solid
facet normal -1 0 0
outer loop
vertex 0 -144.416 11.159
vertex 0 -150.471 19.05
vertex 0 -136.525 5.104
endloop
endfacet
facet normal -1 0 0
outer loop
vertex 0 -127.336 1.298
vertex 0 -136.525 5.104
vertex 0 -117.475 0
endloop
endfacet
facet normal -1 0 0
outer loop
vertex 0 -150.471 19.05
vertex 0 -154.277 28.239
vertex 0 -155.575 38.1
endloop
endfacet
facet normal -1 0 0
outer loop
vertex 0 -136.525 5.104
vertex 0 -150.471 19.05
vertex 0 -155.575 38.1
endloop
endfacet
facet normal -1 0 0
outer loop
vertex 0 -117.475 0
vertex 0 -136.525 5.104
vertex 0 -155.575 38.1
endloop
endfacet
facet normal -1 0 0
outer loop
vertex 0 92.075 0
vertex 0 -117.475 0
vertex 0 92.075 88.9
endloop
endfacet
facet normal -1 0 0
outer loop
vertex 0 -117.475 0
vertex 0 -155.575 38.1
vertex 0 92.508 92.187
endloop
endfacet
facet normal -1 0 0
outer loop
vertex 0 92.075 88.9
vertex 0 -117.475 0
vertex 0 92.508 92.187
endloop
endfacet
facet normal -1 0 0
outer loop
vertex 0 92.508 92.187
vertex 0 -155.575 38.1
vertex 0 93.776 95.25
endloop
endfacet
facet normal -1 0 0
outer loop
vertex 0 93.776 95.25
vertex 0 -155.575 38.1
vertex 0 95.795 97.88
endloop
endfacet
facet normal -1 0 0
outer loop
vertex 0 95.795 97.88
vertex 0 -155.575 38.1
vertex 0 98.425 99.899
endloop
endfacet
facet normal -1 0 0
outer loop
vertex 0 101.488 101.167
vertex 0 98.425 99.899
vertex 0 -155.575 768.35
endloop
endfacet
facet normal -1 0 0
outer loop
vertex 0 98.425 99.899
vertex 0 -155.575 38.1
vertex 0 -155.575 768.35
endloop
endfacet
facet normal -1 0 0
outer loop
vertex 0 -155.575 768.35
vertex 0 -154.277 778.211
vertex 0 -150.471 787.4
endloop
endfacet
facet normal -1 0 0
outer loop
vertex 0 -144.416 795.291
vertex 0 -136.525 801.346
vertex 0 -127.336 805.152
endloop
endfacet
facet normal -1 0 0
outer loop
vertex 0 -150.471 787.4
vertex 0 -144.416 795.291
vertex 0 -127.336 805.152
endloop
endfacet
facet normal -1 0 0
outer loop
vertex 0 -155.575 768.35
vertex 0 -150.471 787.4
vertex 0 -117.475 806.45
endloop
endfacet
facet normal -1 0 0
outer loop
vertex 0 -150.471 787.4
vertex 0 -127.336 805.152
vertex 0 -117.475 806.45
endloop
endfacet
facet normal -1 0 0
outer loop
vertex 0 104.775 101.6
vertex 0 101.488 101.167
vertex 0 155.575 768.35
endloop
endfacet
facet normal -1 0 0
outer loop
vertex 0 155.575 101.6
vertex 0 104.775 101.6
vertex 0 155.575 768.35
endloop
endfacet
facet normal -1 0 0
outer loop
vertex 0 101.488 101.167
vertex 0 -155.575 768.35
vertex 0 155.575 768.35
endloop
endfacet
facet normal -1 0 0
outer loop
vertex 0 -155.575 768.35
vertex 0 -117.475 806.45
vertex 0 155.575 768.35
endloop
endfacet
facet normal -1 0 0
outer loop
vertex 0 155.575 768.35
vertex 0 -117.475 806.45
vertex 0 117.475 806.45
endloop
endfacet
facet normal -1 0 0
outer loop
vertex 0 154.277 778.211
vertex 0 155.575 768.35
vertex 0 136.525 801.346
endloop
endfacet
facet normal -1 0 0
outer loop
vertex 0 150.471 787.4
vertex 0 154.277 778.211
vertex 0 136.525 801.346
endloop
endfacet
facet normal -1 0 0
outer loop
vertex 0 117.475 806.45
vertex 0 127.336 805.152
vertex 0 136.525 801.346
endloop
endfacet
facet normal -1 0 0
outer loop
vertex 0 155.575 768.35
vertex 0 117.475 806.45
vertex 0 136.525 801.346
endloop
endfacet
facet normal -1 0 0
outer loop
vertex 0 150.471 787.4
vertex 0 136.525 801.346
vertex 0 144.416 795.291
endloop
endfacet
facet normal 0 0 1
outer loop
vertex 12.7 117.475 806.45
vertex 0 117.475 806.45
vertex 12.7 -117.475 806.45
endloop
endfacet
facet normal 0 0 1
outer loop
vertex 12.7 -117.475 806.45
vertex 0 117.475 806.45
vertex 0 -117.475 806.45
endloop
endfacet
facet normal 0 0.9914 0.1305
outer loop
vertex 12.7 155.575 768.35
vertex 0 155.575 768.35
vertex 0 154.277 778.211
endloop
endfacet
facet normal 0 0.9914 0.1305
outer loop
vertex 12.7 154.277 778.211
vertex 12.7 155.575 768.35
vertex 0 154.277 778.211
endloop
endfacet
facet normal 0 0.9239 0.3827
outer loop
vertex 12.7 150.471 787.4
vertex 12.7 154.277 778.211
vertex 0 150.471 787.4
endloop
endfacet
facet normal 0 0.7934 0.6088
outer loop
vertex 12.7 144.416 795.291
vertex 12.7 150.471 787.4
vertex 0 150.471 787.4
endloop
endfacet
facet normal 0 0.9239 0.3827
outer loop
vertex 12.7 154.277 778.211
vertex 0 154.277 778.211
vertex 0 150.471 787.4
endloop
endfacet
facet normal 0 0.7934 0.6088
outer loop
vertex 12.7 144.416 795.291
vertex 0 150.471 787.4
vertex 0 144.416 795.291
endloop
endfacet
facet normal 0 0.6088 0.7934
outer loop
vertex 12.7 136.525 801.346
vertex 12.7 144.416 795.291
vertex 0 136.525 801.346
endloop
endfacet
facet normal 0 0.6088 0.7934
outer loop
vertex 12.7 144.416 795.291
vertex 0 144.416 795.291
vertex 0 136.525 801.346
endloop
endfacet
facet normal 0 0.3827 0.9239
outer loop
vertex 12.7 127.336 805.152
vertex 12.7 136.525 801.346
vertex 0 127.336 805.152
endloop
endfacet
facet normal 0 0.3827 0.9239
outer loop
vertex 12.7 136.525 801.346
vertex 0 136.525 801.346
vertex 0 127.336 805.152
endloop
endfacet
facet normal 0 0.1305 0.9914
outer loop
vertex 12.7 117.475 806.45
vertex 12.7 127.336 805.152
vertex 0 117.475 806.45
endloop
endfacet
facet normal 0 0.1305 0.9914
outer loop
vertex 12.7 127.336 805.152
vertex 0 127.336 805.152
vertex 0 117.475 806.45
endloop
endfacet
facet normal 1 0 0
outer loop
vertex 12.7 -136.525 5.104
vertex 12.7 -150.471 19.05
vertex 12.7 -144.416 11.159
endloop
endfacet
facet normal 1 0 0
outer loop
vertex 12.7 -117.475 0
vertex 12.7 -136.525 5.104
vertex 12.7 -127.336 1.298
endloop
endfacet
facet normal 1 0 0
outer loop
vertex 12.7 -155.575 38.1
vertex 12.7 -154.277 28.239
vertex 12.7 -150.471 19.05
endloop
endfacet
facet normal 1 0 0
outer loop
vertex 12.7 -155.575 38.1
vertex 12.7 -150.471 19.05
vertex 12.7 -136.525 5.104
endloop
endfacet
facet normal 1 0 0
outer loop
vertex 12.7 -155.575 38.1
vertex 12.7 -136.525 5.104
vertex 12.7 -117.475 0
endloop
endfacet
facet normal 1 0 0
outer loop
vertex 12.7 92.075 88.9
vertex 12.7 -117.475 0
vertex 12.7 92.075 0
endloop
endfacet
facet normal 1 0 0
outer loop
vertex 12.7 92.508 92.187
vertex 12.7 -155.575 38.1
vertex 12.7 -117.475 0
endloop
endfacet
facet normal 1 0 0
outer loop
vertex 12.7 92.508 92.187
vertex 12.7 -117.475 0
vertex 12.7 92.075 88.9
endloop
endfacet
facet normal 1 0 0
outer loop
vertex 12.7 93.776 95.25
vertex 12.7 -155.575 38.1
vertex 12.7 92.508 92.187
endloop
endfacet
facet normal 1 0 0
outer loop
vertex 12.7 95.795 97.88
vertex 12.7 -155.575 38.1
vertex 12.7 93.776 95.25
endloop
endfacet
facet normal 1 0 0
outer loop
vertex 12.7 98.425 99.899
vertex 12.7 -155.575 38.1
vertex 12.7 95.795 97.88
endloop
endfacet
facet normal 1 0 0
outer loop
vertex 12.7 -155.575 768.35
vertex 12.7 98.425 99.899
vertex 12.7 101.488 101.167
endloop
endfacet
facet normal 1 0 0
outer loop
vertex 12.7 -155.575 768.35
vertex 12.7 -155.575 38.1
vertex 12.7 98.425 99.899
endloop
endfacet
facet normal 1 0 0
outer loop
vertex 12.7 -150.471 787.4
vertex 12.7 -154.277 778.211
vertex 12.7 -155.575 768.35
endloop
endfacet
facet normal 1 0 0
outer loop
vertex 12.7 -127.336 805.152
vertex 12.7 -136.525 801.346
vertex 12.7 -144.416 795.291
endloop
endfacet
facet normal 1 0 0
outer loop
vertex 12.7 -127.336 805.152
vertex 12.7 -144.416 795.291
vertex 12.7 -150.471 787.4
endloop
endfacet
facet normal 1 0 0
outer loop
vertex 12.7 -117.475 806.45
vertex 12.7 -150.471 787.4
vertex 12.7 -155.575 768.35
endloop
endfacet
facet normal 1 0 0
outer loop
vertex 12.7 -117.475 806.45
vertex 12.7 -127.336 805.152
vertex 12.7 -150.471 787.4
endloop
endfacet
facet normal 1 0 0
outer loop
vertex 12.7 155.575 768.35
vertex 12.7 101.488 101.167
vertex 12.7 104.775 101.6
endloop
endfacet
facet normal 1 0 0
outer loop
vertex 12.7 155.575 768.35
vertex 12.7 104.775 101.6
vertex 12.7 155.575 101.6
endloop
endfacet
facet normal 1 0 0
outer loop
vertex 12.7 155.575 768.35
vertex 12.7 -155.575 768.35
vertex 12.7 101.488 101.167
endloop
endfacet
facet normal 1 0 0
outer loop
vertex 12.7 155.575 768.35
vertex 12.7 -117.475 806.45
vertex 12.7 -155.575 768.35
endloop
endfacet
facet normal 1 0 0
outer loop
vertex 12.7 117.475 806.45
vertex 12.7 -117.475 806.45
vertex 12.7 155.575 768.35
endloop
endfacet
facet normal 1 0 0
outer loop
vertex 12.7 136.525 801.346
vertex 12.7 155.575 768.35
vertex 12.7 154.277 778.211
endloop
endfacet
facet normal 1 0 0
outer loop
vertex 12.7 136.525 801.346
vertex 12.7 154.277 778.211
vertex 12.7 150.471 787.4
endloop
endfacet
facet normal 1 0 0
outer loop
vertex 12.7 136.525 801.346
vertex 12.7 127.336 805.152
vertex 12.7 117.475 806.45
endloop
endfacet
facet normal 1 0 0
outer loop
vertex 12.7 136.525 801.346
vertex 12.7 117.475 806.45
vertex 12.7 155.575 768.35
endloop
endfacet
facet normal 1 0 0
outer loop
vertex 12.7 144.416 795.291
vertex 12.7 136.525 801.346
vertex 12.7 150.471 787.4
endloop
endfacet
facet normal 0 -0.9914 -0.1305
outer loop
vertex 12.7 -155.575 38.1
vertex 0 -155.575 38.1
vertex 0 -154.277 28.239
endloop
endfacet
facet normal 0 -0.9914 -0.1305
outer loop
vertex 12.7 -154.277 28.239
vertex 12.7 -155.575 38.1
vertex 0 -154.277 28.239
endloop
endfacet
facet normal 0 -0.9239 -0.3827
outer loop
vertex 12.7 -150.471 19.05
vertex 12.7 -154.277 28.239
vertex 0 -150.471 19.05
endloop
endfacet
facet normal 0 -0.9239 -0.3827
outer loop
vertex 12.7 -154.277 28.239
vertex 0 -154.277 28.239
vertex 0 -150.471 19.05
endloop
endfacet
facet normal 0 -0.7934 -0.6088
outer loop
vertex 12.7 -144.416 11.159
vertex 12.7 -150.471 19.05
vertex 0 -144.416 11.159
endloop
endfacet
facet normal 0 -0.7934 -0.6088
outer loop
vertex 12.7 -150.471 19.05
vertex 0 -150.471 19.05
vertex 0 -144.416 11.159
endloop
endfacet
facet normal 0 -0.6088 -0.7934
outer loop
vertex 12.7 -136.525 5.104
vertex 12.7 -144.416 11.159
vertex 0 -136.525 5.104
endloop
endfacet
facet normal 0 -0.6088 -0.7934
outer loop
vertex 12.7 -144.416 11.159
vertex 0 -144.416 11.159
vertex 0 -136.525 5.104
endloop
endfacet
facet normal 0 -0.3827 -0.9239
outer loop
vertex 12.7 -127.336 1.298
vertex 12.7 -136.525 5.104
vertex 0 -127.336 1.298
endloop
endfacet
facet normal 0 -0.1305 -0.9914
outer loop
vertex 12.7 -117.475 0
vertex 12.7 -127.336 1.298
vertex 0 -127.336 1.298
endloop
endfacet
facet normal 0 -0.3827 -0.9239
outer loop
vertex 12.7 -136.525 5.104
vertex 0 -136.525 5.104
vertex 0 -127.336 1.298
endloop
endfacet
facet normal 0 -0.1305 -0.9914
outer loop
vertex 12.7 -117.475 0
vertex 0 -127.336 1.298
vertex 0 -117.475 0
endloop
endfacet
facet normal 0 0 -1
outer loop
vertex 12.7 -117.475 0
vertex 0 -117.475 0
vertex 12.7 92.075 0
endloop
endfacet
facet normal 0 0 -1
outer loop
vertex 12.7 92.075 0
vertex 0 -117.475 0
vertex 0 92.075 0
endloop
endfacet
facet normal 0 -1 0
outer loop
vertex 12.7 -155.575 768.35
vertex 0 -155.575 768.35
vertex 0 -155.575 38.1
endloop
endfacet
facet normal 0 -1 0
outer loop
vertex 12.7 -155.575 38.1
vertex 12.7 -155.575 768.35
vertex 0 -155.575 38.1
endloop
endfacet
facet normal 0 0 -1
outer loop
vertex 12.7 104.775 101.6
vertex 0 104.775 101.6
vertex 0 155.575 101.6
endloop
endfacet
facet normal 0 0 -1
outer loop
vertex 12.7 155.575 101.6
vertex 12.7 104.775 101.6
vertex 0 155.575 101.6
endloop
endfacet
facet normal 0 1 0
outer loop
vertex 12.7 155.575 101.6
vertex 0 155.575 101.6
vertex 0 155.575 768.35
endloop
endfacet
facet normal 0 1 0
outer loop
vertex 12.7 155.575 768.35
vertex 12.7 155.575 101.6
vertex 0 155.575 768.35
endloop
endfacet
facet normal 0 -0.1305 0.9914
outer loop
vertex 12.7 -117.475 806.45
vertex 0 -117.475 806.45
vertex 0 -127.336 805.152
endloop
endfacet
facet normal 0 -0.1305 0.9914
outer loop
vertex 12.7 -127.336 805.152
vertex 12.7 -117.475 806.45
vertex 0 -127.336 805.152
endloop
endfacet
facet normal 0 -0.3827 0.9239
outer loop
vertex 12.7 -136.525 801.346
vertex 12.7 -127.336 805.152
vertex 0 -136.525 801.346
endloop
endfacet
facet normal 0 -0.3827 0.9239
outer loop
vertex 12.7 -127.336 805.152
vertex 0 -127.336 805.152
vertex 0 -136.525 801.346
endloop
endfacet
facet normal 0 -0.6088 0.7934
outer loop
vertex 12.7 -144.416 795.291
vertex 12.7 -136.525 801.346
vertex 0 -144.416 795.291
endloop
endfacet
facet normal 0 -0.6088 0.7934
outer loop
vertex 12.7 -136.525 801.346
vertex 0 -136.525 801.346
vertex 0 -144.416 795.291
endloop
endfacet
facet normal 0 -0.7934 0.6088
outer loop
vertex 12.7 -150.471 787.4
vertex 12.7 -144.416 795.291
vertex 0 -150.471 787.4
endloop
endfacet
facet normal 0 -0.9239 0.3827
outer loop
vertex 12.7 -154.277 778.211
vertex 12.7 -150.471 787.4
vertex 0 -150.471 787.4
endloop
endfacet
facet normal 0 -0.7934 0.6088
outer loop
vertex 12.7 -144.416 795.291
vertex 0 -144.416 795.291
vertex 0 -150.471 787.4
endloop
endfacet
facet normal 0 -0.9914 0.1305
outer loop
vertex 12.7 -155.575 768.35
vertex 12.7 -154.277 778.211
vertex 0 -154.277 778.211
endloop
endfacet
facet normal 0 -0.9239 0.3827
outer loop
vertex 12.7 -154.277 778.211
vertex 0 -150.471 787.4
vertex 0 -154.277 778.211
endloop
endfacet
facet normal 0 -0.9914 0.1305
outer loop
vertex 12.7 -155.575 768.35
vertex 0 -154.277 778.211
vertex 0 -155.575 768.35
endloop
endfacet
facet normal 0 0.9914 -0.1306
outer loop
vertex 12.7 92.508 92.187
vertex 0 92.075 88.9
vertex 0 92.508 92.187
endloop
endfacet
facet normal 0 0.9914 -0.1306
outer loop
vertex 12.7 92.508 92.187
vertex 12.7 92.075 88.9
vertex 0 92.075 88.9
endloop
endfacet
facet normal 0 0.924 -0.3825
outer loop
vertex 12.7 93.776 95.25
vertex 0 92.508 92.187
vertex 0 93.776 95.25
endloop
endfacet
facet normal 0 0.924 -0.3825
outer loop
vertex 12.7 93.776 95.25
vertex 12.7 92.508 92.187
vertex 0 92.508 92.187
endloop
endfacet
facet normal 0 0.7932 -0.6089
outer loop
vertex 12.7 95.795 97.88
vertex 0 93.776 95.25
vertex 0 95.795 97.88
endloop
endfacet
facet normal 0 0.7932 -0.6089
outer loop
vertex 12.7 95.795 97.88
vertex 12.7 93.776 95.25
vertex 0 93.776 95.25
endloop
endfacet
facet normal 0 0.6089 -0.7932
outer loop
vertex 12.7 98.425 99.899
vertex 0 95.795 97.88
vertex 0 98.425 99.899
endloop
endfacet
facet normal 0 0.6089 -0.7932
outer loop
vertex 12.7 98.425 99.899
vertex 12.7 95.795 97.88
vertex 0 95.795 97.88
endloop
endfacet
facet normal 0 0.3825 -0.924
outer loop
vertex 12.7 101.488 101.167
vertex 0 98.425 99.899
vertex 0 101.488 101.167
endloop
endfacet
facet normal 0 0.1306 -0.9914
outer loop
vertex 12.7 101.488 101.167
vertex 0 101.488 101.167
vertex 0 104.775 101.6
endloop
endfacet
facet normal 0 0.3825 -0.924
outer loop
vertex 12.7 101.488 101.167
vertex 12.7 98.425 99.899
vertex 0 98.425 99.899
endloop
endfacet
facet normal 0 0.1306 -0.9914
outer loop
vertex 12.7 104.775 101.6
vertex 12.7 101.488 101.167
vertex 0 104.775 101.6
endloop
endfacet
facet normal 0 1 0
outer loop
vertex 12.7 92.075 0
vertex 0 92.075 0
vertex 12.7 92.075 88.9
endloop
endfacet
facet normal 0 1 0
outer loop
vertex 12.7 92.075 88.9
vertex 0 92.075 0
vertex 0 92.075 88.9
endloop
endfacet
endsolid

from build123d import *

# Parameters (mm, degrees)
F1_DEPTH = 12.7
F2_R     = 12.7


with BuildPart() as f1:
    # F0 (on Right) → F1 (new body)
    with BuildSketch(Plane.YZ):
        with BuildLine():
            Line((117.475, 806.45), (-117.475, 806.45))
            ThreePointArc((-117.475, 806.45), (-144.415768, 795.290768), (-155.575, 768.35))
            Line((-155.575, 768.35), (-155.575, 38.1))
            ThreePointArc((-155.575, 38.1), (-144.415768, 11.159232), (-117.475, 0))
            Line((-117.475, 0), (92.075, 0))
            Line((92.075, 0), (92.075, 101.6))
            Line((92.075, 101.6), (155.575, 101.6))
            Line((155.575, 101.6), (155.575, 768.35))
            ThreePointArc((155.575, 768.35), (144.415768, 795.290768), (117.475, 806.45))
        make_face()
    extrude(amount=F1_DEPTH)

    # F2
    f2_edges = [f1.edges().sort_by_distance(p)[0] for p in [
        (6.35, 92.075, 101.6),
    ]]
    fillet(f2_edges, radius=F2_R)


solid = f1.part
